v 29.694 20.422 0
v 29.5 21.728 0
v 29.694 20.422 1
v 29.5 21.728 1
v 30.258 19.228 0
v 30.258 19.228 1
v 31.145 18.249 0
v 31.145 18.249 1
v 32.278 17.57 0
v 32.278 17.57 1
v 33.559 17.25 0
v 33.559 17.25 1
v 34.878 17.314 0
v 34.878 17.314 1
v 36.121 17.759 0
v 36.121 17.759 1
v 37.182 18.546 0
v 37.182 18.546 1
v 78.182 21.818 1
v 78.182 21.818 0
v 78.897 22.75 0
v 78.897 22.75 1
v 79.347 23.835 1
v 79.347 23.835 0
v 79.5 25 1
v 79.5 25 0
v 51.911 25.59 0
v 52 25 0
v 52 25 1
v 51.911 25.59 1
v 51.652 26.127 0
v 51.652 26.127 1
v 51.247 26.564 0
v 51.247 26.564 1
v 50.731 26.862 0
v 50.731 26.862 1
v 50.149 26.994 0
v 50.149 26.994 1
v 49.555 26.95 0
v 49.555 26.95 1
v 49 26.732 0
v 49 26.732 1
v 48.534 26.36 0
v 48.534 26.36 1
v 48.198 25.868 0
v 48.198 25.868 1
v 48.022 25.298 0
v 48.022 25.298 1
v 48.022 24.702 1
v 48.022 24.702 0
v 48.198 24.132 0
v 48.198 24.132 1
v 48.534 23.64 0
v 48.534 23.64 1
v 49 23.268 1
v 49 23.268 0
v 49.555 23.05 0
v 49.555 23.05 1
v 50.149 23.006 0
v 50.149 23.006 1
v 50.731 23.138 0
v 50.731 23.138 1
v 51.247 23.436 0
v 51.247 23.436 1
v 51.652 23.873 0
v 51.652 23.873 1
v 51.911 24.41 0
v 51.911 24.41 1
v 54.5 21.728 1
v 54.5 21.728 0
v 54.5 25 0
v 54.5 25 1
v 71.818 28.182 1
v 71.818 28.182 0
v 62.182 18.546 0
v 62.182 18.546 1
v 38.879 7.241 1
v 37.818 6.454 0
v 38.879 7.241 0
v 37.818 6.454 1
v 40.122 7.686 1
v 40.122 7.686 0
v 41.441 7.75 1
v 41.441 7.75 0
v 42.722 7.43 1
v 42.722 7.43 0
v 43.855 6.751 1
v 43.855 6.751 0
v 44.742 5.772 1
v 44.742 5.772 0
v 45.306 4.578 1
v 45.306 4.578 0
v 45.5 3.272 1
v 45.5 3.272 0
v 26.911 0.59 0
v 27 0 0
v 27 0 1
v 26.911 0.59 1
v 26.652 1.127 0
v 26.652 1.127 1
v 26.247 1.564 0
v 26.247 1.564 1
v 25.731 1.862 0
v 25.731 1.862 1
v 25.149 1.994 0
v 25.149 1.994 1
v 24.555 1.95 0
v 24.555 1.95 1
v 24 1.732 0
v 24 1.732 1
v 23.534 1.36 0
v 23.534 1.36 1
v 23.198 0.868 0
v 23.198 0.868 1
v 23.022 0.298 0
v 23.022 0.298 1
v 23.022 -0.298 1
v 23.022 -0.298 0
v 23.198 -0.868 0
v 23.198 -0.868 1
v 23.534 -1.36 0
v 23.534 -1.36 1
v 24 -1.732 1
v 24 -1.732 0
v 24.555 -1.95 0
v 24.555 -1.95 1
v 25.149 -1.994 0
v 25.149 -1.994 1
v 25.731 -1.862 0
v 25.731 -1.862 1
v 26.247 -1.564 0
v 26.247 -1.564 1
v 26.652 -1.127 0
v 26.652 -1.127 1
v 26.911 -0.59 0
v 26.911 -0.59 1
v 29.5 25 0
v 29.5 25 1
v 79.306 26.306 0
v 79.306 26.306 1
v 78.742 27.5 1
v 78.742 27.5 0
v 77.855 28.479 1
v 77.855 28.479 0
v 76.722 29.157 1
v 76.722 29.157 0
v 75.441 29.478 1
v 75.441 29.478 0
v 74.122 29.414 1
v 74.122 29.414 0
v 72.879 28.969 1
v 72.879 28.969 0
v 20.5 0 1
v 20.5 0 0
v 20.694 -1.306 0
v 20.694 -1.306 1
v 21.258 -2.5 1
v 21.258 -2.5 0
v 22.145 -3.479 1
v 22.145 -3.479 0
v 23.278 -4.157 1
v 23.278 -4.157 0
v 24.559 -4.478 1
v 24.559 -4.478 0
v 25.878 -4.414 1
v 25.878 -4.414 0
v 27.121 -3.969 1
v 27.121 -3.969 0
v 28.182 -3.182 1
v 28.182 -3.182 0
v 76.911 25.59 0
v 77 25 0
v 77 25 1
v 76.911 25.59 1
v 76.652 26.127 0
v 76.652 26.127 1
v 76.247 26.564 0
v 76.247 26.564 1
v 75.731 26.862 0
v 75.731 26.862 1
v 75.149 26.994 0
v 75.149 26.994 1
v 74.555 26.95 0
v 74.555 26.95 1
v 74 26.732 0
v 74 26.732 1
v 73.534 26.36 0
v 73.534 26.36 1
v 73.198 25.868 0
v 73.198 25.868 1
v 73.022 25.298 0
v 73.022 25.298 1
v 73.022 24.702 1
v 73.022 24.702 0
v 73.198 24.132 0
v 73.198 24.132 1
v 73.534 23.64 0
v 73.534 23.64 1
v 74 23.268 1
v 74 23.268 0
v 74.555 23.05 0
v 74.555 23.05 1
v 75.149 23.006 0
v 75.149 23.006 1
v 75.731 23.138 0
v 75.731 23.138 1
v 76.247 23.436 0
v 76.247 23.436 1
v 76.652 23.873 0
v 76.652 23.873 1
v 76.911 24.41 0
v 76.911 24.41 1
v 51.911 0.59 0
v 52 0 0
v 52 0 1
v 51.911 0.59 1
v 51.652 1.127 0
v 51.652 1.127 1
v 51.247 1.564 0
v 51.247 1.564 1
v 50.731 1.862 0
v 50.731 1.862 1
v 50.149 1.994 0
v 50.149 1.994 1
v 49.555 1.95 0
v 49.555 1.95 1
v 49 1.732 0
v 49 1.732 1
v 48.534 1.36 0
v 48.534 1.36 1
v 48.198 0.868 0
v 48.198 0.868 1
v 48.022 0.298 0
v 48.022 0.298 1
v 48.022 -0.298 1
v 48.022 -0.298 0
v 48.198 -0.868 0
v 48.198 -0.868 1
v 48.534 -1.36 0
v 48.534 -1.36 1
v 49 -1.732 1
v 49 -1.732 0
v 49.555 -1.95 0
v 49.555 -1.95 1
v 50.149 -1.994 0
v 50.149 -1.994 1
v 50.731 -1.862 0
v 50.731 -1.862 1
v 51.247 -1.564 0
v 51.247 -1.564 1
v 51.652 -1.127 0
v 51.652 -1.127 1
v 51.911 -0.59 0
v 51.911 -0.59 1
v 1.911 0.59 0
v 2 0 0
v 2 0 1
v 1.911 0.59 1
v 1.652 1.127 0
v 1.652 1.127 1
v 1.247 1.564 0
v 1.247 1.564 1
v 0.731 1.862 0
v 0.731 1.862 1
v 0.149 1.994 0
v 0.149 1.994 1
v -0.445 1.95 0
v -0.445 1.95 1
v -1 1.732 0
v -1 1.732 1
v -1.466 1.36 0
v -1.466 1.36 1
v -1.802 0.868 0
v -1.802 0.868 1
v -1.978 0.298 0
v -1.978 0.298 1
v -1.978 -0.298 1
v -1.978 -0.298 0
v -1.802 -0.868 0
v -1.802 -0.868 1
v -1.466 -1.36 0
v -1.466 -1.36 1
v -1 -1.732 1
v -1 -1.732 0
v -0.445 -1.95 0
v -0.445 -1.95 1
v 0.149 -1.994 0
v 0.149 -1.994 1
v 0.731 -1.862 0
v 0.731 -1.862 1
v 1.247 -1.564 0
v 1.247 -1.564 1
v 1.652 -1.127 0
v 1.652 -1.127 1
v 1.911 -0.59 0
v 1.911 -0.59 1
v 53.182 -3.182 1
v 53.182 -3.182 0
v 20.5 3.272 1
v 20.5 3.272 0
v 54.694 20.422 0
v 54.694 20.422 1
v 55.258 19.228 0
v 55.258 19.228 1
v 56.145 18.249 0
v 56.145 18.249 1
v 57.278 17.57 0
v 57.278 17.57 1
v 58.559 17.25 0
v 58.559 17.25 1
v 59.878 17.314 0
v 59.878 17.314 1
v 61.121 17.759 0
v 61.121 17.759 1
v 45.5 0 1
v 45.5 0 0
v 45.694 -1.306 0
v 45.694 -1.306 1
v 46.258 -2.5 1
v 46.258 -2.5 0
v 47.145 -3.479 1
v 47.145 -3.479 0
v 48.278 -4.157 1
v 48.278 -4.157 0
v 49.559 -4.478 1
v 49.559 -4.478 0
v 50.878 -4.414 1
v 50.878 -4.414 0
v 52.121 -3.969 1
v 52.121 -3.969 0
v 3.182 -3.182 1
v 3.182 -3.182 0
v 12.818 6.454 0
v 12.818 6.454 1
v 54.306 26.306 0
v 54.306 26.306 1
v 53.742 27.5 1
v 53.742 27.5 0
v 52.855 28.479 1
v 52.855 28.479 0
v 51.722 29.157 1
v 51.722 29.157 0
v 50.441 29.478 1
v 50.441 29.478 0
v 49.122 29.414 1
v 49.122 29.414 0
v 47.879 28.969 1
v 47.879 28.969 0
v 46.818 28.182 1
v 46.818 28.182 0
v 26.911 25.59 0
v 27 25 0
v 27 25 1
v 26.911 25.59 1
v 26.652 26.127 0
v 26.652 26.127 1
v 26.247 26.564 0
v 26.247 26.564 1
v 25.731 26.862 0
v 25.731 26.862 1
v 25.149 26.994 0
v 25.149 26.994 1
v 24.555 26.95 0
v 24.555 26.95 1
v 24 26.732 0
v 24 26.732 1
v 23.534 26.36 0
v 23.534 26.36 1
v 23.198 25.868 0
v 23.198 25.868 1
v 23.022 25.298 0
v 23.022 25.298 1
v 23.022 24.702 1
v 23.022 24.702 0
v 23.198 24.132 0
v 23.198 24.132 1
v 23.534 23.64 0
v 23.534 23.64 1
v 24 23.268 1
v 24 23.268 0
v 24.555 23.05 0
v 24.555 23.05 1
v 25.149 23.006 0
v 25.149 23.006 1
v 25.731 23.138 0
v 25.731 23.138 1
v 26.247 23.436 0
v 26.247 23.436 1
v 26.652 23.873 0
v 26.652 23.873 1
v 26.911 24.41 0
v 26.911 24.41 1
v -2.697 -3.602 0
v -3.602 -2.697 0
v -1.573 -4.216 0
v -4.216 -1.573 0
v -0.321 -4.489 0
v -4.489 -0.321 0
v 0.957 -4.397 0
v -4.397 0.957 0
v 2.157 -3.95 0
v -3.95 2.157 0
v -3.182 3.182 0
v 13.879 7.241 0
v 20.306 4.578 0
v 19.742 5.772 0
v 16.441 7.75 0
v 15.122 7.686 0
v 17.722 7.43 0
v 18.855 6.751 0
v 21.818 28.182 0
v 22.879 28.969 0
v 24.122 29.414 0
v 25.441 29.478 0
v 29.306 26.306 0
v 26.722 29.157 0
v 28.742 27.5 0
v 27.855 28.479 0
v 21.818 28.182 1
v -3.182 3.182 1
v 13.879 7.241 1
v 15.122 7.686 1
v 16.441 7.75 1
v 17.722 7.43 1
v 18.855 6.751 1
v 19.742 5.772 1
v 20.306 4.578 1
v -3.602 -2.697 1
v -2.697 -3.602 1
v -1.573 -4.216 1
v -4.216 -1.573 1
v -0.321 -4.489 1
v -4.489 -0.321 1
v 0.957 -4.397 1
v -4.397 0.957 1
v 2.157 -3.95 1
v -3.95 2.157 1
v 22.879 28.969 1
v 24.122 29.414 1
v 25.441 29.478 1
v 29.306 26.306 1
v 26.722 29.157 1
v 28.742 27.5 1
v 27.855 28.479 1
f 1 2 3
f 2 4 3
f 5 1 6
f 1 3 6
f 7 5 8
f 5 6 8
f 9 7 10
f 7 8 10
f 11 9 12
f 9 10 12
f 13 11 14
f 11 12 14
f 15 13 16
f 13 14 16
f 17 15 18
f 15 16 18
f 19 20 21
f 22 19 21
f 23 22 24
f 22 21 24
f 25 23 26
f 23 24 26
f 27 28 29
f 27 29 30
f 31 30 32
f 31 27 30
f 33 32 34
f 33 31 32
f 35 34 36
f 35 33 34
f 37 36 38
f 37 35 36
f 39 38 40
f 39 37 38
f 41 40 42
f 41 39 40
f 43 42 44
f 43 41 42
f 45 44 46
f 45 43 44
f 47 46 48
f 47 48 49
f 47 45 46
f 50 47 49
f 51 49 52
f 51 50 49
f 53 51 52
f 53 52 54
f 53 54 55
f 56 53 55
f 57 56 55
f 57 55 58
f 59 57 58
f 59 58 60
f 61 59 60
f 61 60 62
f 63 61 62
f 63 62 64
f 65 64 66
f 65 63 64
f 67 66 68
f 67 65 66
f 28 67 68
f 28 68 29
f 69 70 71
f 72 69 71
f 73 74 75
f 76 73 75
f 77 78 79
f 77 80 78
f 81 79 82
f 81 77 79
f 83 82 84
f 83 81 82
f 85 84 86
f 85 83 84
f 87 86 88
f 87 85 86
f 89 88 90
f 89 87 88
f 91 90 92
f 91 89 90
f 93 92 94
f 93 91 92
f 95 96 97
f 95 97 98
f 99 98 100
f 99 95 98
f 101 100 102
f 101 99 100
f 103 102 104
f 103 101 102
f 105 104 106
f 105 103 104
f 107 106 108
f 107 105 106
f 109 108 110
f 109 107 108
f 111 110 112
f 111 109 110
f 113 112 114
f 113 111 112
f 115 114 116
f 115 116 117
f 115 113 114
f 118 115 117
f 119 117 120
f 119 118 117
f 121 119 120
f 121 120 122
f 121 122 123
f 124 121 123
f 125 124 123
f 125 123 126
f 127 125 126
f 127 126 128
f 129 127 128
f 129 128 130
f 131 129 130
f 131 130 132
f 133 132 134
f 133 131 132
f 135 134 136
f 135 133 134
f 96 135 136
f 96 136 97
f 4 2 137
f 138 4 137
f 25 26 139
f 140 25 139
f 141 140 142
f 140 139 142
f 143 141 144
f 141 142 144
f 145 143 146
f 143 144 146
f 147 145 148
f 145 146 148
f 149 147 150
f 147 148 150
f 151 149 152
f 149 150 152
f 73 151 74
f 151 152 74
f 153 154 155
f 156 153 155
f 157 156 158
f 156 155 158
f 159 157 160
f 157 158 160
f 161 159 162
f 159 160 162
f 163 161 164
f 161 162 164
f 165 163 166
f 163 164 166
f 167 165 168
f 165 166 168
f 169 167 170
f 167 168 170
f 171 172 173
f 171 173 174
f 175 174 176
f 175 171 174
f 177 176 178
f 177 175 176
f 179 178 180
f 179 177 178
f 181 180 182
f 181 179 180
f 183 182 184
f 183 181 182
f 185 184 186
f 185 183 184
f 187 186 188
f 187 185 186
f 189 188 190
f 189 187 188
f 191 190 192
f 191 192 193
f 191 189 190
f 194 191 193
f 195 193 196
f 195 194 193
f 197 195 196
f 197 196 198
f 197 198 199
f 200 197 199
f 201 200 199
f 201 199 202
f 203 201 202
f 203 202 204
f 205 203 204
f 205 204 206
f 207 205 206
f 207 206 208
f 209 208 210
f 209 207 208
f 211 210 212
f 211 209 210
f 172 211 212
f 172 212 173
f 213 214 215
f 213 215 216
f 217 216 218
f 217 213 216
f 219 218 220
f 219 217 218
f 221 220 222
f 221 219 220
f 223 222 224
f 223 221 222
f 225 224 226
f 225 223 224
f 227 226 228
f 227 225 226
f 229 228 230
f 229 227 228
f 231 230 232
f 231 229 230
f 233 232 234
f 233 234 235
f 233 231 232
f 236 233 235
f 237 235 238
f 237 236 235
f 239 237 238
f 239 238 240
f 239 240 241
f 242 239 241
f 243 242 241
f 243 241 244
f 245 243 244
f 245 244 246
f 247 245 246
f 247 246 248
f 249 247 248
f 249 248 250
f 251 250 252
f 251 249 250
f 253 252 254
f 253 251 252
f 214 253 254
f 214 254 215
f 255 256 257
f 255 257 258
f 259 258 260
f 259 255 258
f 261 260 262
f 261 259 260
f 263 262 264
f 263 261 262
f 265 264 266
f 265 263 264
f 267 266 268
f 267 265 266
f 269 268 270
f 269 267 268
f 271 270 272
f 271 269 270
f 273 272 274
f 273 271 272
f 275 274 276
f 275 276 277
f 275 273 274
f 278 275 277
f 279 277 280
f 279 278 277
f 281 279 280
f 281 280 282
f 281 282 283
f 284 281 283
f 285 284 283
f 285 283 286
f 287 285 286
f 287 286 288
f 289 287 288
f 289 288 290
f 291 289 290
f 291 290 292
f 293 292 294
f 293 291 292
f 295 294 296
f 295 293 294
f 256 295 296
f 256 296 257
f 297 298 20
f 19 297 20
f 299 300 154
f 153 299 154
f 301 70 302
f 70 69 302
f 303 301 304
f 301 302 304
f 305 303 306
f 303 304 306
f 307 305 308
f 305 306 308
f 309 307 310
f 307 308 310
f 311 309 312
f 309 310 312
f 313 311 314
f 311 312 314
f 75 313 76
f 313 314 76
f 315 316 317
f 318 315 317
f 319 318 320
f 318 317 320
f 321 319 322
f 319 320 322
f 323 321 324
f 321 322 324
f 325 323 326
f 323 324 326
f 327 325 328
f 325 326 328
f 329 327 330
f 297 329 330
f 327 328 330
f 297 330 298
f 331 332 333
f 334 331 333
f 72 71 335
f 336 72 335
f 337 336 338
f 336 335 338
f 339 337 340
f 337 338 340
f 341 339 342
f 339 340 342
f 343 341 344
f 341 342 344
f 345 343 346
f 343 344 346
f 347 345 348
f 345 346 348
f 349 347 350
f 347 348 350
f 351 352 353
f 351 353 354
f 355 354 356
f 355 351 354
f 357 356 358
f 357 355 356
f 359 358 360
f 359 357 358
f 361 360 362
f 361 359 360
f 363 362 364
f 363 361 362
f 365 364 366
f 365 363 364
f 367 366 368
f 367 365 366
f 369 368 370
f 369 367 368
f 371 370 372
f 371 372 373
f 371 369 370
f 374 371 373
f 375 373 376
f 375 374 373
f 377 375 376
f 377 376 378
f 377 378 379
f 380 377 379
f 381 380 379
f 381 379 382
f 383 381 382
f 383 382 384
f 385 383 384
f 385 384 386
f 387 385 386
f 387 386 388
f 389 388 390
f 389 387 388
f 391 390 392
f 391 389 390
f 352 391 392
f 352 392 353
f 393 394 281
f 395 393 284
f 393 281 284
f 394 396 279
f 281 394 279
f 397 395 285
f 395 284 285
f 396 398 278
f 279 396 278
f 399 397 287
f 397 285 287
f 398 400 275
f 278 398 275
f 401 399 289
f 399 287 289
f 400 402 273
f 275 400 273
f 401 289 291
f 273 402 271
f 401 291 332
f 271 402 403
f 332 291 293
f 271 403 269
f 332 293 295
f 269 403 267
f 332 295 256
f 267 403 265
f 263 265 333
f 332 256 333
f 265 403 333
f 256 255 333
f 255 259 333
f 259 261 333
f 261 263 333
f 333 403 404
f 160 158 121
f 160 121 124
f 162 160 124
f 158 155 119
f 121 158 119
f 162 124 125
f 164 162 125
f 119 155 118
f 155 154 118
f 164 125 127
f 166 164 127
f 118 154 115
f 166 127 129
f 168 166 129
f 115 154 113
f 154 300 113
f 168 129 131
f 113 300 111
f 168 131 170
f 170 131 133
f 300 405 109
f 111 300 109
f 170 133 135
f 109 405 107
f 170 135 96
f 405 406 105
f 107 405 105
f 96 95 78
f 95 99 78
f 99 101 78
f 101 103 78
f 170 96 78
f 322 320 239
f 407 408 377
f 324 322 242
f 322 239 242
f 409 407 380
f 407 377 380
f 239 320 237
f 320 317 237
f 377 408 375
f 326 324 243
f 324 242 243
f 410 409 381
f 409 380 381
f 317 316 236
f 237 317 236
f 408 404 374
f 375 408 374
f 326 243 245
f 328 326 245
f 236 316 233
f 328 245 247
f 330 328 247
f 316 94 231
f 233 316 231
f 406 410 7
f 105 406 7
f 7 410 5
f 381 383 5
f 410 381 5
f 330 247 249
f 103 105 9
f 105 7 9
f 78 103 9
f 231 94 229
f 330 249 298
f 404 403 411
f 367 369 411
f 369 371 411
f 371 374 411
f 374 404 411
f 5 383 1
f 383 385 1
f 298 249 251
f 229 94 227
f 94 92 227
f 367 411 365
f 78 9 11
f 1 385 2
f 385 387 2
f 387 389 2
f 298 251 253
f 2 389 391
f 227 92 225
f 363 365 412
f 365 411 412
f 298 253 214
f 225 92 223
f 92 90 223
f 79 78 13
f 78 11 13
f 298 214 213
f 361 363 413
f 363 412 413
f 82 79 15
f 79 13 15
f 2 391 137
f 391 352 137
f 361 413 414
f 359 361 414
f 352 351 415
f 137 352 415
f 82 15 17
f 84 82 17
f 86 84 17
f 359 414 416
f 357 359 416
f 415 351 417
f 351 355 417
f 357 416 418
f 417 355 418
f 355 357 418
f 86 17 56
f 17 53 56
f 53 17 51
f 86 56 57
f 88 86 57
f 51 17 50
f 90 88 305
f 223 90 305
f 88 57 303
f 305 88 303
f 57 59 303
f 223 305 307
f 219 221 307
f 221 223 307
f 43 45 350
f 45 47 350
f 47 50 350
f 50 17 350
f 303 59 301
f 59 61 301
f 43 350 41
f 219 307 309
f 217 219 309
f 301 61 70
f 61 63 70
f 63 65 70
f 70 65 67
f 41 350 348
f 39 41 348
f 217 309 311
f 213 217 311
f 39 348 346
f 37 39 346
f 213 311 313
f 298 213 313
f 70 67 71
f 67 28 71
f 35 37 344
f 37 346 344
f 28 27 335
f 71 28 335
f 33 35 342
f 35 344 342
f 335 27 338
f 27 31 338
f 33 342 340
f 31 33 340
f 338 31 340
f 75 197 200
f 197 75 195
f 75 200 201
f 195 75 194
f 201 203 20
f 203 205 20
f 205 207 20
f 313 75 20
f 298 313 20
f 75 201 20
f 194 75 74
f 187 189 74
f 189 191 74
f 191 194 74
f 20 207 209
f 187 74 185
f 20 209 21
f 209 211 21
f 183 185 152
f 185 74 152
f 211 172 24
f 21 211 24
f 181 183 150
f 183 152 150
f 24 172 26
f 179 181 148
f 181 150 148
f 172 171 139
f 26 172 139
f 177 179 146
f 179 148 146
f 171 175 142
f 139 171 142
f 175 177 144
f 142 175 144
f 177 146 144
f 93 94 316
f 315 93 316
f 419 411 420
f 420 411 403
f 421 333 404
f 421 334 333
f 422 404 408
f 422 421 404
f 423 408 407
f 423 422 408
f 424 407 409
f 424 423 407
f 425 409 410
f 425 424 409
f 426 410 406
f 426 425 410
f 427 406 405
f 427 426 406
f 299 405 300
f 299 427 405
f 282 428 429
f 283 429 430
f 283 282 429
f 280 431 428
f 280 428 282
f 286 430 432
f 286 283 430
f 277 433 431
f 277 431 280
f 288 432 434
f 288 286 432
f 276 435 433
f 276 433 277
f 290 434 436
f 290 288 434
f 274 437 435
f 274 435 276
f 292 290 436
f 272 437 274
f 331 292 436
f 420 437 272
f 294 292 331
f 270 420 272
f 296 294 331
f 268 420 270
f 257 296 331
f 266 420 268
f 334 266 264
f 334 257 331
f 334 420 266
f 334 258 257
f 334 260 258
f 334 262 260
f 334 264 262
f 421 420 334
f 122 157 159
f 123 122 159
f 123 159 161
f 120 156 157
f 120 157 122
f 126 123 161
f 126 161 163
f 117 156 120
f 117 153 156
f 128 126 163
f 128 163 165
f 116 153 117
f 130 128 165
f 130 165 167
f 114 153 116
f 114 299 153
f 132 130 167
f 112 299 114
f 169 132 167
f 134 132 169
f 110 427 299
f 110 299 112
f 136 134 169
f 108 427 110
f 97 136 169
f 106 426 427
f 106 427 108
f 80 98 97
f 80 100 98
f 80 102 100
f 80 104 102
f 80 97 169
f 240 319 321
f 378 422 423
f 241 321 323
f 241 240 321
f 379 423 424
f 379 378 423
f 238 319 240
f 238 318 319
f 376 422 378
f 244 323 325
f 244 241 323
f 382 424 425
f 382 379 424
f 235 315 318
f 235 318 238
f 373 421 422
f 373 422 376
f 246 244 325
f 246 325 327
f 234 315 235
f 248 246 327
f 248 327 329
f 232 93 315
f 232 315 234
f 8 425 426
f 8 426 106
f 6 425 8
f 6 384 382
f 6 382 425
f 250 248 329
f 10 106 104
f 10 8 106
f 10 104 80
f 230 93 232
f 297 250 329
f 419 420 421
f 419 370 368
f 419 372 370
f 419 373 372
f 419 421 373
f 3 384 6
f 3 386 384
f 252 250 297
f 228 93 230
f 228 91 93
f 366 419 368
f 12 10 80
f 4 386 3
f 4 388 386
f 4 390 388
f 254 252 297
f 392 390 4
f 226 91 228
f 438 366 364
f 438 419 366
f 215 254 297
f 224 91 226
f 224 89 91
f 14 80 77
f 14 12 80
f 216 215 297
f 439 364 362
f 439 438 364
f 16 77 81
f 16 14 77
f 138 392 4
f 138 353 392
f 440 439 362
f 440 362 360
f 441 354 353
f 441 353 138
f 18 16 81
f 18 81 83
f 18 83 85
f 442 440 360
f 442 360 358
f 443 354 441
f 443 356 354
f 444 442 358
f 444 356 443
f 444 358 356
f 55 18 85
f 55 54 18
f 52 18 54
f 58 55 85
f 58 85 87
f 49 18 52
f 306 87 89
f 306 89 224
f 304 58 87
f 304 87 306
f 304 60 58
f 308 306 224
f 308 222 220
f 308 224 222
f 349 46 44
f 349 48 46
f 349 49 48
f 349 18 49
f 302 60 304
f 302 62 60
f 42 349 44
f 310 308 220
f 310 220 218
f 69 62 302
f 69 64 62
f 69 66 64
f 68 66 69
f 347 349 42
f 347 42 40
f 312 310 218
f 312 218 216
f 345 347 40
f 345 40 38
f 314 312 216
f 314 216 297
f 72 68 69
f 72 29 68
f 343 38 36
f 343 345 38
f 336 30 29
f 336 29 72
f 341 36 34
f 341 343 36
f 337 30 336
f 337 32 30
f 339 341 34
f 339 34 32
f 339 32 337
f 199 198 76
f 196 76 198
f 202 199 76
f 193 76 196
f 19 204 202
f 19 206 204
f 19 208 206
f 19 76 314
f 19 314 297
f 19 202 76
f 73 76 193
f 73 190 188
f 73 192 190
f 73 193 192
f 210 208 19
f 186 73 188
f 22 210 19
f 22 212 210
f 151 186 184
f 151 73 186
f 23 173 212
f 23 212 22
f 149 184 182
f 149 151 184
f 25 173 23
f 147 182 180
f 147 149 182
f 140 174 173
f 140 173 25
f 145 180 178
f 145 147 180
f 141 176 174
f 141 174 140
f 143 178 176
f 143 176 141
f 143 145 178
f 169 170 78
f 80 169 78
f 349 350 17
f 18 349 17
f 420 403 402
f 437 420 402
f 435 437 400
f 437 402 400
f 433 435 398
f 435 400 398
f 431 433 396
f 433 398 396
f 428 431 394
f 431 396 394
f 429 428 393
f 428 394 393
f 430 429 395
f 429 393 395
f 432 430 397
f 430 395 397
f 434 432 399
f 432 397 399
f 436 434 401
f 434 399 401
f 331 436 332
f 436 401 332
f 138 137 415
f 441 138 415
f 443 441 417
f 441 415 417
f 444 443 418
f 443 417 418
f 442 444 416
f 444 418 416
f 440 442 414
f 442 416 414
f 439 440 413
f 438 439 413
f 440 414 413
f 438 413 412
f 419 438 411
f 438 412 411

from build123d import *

# Parameters (mm, degrees)
F0_R     = 2
F1_DEPTH = 1
F2_R     = 4.5


with BuildPart() as f1:
    # F0 (on Top) → F1 (new body)
    with BuildSketch(Plane.XY):
        with BuildLine():
            Line((21.818019, 28.181981), (-3.181981, 3.181981))
            ThreePointArc((-3.181981, 3.181981), (-3.181981, -3.181981), (3.181981, -3.181981))
            Line((3.181981, -3.181981), (20.5, 14.136039))
            Line((20.5, 14.136039), (20.5, 0))
            ThreePointArc((20.5, 0), (25, 4.5), (29.5, 0))
            ThreePointArc((29.5, 0), (29.157458, -1.722075), (28.181981, -3.181981))
            Line((28.181981, -3.181981), (45.5, 14.136039))
            Line((45.5, 14.136039), (45.5, 0))
            ThreePointArc((45.5, 0), (50, 4.5), (54.5, 0))
            ThreePointArc((54.5, 0), (54.157458, -1.722075), (53.181981, -3.181981))
            Line((53.181981, -3.181981), (78.181981, 21.818019))
            ThreePointArc((78.181981, 21.818019), (71.818019, 21.818019), (71.818019, 28.181981))
            Line((71.818019, 28.181981), (54.5, 10.863961))
            Line((54.5, 10.863961), (54.5, 25))
            ThreePointArc((54.5, 25), (48.277925, 20.842542), (46.818019, 28.181981))
            Line((46.818019, 28.181981), (29.5, 10.863961))
            Line((29.5, 10.863961), (29.5, 25))
            ThreePointArc((29.5, 25), (23.277925, 20.842542), (21.818019, 28.181981))
        make_face()
        Circle(F0_R, mode=Mode.SUBTRACT)
        with BuildLine():
            ThreePointArc((29.5, 25), (26.722075, 29.157458), (21.818019, 28.181981))
            ThreePointArc((21.818019, 28.181981), (23.277925, 20.842542), (29.5, 25))
        make_face()
        with Locations((25, 25)):
            Circle(F0_R, mode=Mode.SUBTRACT)
        with BuildLine():
            ThreePointArc((29.5, 0), (25, 4.5), (20.5, 0))
            ThreePointArc((20.5, 0), (23.277925, -4.157458), (28.181981, -3.181981))
            ThreePointArc((28.181981, -3.181981), (29.157458, -1.722075), (29.5, 0))
        make_face()
        with Locations((25, 0)):
            Circle(F0_R, mode=Mode.SUBTRACT)
        with BuildLine():
            ThreePointArc((54.5, 0), (50, 4.5), (45.5, 0))
            ThreePointArc((45.5, 0), (48.277925, -4.157458), (53.181981, -3.181981))
            ThreePointArc((53.181981, -3.181981), (54.157458, -1.722075), (54.5, 0))
        make_face()
        with Locations((50, 0)):
            Circle(F0_R, mode=Mode.SUBTRACT)
        with BuildLine():
            ThreePointArc((54.5, 25), (51.722075, 29.157458), (46.818019, 28.181981))
            ThreePointArc((46.818019, 28.181981), (48.277925, 20.842542), (54.5, 25))
        make_face()
        with Locations((50, 25)):
            Circle(F0_R, mode=Mode.SUBTRACT)
        with BuildLine():
            ThreePointArc((79.5, 25), (76.722075, 29.157458), (71.818019, 28.181981))
            ThreePointArc((71.818019, 28.181981), (71.818019, 21.818019), (78.181981, 21.818019))
            ThreePointArc((78.181981, 21.818019), (79.157458, 23.277925), (79.5, 25))
        make_face()
        with Locations((75, 25)):
            Circle(F0_R, mode=Mode.SUBTRACT)
    extrude(amount=F1_DEPTH)

    # F2
    f2_edges = [f1.edges().sort_by_distance(p)[0] for p in [
        (20.5, 14.136039, 0.5),
        (45.5, 14.136039, 0.5),
        (29.5, 10.863961, 0.5),
        (54.5, 10.863961, 0.5),
    ]]
    fillet(f2_edges, radius=F2_R)


solid = f1.part
